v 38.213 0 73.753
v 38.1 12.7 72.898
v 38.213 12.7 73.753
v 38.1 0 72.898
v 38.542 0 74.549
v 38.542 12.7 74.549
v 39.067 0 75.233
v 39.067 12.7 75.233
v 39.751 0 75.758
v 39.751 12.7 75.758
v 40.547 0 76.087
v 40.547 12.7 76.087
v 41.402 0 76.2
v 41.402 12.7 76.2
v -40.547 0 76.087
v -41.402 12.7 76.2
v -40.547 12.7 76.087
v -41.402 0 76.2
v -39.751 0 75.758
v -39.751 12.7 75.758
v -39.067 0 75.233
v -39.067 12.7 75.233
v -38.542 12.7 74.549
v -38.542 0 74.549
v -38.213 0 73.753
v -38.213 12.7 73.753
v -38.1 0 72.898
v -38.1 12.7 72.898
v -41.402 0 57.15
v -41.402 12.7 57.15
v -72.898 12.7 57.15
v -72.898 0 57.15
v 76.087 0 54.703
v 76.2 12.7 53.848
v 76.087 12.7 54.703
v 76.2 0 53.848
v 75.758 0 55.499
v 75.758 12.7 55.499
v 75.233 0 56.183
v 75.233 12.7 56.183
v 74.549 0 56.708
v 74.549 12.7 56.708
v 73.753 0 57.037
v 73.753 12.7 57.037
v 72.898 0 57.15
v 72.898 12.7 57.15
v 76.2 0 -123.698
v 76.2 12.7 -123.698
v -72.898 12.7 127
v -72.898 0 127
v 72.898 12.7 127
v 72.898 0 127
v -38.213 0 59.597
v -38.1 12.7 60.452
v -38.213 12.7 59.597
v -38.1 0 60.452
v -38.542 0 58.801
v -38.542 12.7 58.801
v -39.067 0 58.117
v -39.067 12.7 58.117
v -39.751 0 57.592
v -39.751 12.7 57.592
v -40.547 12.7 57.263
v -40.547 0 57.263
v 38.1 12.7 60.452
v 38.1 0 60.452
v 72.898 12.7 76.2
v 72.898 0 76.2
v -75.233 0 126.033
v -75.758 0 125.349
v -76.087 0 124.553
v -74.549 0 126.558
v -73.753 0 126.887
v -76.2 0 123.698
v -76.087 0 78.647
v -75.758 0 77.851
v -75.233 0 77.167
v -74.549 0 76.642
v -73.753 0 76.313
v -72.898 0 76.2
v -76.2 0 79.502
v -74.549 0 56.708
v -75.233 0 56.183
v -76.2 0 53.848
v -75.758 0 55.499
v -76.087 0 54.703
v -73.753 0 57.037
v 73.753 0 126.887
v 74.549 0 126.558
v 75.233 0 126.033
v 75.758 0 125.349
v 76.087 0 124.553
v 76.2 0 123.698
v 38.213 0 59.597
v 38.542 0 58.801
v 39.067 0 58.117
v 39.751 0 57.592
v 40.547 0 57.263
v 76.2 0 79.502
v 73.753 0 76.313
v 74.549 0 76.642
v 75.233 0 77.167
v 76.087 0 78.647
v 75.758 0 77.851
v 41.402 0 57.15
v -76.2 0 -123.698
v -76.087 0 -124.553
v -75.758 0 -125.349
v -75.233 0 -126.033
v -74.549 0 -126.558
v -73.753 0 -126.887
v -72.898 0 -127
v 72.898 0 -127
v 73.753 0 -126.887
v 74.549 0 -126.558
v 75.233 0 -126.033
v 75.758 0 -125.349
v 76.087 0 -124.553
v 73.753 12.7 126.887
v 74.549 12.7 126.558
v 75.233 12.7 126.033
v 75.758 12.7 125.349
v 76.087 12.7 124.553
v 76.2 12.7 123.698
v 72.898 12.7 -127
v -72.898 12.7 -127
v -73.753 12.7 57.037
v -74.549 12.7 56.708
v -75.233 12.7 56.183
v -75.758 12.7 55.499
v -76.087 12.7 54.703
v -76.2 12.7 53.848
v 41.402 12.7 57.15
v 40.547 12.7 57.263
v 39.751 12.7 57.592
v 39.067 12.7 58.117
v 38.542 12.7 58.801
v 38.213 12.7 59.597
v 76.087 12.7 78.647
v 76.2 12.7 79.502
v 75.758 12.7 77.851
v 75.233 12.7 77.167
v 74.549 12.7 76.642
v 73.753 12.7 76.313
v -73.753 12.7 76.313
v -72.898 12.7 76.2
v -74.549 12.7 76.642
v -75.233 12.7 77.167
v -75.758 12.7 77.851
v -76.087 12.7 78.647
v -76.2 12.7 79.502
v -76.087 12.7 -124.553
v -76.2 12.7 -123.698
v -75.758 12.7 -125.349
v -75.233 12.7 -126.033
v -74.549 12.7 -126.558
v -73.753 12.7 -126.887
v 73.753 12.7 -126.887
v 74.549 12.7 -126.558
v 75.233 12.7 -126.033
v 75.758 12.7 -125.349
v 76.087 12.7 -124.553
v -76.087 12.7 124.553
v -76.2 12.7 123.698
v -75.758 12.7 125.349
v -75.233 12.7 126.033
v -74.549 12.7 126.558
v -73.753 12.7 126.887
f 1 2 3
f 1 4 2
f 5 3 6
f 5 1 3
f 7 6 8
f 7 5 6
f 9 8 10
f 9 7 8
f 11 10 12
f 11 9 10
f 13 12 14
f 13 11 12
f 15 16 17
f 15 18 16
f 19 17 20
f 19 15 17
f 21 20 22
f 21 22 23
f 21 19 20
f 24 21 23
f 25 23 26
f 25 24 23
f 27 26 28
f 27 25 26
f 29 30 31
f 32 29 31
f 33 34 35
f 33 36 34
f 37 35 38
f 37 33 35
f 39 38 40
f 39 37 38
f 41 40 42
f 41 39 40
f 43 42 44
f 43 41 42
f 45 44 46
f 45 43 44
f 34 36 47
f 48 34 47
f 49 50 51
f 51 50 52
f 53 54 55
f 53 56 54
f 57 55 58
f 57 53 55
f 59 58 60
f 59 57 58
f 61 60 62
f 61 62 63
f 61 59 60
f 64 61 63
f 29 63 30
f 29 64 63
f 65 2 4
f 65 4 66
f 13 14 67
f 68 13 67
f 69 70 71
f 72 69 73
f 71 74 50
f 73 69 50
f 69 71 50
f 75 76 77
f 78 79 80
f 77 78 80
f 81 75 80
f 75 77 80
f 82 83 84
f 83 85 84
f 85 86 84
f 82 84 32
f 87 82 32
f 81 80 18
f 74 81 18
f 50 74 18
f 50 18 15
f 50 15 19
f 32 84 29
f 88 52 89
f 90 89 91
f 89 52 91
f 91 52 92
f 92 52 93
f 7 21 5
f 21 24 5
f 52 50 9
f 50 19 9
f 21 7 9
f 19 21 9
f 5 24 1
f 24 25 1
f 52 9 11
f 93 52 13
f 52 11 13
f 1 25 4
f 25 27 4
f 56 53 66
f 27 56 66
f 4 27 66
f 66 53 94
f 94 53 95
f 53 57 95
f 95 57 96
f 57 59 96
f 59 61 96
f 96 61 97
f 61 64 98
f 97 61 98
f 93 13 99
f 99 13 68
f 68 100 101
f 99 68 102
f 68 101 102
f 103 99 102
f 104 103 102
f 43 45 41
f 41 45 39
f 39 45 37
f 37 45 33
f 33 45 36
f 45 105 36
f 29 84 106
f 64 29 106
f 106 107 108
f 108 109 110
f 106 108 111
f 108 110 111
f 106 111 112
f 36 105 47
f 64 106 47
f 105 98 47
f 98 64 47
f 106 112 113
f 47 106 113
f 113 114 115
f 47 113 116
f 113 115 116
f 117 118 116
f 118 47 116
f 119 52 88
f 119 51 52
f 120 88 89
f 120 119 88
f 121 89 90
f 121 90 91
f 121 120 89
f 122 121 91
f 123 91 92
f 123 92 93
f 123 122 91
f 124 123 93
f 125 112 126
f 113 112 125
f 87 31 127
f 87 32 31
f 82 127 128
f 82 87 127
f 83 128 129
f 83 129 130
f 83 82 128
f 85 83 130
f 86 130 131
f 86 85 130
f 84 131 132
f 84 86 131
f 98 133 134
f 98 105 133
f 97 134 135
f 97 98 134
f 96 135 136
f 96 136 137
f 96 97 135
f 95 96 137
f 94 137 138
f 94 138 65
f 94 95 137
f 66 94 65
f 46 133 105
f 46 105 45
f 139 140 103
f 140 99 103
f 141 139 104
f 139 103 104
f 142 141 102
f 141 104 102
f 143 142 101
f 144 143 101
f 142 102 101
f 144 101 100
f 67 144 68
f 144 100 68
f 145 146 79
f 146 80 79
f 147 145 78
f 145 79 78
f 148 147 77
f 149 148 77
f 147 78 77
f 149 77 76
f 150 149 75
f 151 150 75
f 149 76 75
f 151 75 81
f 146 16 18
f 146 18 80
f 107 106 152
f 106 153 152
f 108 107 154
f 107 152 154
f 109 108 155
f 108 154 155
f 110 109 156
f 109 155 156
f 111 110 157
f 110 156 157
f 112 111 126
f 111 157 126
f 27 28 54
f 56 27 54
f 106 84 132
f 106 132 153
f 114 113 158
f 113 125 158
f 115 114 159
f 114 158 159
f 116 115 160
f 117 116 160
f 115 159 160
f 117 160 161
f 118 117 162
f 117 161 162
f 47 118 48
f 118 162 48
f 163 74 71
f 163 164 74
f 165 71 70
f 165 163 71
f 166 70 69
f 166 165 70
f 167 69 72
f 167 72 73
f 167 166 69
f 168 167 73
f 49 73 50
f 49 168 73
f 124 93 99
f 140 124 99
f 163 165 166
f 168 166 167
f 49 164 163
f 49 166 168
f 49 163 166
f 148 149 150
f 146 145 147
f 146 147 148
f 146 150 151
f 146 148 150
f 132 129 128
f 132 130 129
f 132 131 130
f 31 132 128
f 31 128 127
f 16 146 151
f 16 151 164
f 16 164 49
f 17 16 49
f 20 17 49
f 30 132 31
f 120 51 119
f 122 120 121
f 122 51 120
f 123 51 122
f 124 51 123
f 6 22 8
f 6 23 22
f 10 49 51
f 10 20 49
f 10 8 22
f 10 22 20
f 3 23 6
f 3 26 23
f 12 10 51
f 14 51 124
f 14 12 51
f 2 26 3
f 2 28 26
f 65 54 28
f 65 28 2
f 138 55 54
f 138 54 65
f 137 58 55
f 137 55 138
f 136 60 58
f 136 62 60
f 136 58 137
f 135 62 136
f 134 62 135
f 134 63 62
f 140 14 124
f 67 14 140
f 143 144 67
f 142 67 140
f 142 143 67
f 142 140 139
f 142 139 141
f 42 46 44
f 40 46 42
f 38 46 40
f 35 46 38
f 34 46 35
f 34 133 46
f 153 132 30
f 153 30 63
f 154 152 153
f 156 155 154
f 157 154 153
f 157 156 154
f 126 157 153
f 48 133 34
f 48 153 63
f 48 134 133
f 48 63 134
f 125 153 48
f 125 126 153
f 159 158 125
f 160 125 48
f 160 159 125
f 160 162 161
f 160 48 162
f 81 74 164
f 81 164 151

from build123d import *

# Parameters (mm, degrees)
SKETCH1_W            = 152.4
SKETCH1_H            = 254
BOSS_EXTRUDE1_DEPTH  = 12.7
SKETCH2_W            = 38.1
SKETCH2_H            = 19.05
CUT_EXTRUDE1_DEPTH   = 149.649688866
FILLET1_R            = 3.302
FILLET1_OF_MIRROR1_R = 3.302
FILLET2_R            = 3.302


with BuildPart() as part:
    # Sketch1 → Boss-Extrude1 (new body)
    with BuildSketch(Plane(origin=(0, 0, 0), x_dir=(1, 0, 0), z_dir=(0, 1, 0))):
        Rectangle(SKETCH1_W, SKETCH1_H)
    extrude(amount=BOSS_EXTRUDE1_DEPTH)

    # Sketch2 → Cut-Extrude1 (cut, through all)
    with BuildSketch(Plane(origin=(0, 12.7, 0), x_dir=(1, 0, 0), z_dir=(0, 1, 0))):
        with Locations((57.15, -66.675)):
            Rectangle(SKETCH2_W, SKETCH2_H)
    cut_extrude1 = extrude(amount=-CUT_EXTRUDE1_DEPTH, mode=Mode.SUBTRACT)

    # Fillet1
    fillet1_edges = [part.edges().sort_by_distance(p)[0] for p in [
        (38.1, 6.35, 76.2),
        (38.1, 6.35, 57.15),
    ]]
    fillet(fillet1_edges, radius=FILLET1_R)

    # Mirror1: Cut-Extrude1 across plane
    add(cut_extrude1.mirror(Plane(origin=(0, 0, 0), x_dir=(0, 0, 1), z_dir=(1, 0, 0))), mode=Mode.SUBTRACT)

    # Fillet1 of Mirror1
    fillet1_of_mirror1_edges = [part.edges().sort_by_distance(p)[0] for p in [
        (-38.1, 6.35, 76.2),
        (-38.1, 6.35, 57.15),
    ]]
    fillet(fillet1_of_mirror1_edges, radius=FILLET1_OF_MIRROR1_R)

    # Fillet2
    fillet2_edges = [part.edges().sort_by_distance(p)[0] for p in [
        (76.2, 6.35, 57.15),
        (76.2, 6.35, 76.2),
        (-76.2, 6.35, 76.2),
        (-76.2, 6.35, 57.15),
        (76.2, 6.35, 127),
        (-76.2, 6.35, 127),
        (-76.2, 6.35, -127),
        (76.2, 6.35, -127),
    ]]
    fillet(fillet2_edges, radius=FILLET2_R)


solid = part.part
